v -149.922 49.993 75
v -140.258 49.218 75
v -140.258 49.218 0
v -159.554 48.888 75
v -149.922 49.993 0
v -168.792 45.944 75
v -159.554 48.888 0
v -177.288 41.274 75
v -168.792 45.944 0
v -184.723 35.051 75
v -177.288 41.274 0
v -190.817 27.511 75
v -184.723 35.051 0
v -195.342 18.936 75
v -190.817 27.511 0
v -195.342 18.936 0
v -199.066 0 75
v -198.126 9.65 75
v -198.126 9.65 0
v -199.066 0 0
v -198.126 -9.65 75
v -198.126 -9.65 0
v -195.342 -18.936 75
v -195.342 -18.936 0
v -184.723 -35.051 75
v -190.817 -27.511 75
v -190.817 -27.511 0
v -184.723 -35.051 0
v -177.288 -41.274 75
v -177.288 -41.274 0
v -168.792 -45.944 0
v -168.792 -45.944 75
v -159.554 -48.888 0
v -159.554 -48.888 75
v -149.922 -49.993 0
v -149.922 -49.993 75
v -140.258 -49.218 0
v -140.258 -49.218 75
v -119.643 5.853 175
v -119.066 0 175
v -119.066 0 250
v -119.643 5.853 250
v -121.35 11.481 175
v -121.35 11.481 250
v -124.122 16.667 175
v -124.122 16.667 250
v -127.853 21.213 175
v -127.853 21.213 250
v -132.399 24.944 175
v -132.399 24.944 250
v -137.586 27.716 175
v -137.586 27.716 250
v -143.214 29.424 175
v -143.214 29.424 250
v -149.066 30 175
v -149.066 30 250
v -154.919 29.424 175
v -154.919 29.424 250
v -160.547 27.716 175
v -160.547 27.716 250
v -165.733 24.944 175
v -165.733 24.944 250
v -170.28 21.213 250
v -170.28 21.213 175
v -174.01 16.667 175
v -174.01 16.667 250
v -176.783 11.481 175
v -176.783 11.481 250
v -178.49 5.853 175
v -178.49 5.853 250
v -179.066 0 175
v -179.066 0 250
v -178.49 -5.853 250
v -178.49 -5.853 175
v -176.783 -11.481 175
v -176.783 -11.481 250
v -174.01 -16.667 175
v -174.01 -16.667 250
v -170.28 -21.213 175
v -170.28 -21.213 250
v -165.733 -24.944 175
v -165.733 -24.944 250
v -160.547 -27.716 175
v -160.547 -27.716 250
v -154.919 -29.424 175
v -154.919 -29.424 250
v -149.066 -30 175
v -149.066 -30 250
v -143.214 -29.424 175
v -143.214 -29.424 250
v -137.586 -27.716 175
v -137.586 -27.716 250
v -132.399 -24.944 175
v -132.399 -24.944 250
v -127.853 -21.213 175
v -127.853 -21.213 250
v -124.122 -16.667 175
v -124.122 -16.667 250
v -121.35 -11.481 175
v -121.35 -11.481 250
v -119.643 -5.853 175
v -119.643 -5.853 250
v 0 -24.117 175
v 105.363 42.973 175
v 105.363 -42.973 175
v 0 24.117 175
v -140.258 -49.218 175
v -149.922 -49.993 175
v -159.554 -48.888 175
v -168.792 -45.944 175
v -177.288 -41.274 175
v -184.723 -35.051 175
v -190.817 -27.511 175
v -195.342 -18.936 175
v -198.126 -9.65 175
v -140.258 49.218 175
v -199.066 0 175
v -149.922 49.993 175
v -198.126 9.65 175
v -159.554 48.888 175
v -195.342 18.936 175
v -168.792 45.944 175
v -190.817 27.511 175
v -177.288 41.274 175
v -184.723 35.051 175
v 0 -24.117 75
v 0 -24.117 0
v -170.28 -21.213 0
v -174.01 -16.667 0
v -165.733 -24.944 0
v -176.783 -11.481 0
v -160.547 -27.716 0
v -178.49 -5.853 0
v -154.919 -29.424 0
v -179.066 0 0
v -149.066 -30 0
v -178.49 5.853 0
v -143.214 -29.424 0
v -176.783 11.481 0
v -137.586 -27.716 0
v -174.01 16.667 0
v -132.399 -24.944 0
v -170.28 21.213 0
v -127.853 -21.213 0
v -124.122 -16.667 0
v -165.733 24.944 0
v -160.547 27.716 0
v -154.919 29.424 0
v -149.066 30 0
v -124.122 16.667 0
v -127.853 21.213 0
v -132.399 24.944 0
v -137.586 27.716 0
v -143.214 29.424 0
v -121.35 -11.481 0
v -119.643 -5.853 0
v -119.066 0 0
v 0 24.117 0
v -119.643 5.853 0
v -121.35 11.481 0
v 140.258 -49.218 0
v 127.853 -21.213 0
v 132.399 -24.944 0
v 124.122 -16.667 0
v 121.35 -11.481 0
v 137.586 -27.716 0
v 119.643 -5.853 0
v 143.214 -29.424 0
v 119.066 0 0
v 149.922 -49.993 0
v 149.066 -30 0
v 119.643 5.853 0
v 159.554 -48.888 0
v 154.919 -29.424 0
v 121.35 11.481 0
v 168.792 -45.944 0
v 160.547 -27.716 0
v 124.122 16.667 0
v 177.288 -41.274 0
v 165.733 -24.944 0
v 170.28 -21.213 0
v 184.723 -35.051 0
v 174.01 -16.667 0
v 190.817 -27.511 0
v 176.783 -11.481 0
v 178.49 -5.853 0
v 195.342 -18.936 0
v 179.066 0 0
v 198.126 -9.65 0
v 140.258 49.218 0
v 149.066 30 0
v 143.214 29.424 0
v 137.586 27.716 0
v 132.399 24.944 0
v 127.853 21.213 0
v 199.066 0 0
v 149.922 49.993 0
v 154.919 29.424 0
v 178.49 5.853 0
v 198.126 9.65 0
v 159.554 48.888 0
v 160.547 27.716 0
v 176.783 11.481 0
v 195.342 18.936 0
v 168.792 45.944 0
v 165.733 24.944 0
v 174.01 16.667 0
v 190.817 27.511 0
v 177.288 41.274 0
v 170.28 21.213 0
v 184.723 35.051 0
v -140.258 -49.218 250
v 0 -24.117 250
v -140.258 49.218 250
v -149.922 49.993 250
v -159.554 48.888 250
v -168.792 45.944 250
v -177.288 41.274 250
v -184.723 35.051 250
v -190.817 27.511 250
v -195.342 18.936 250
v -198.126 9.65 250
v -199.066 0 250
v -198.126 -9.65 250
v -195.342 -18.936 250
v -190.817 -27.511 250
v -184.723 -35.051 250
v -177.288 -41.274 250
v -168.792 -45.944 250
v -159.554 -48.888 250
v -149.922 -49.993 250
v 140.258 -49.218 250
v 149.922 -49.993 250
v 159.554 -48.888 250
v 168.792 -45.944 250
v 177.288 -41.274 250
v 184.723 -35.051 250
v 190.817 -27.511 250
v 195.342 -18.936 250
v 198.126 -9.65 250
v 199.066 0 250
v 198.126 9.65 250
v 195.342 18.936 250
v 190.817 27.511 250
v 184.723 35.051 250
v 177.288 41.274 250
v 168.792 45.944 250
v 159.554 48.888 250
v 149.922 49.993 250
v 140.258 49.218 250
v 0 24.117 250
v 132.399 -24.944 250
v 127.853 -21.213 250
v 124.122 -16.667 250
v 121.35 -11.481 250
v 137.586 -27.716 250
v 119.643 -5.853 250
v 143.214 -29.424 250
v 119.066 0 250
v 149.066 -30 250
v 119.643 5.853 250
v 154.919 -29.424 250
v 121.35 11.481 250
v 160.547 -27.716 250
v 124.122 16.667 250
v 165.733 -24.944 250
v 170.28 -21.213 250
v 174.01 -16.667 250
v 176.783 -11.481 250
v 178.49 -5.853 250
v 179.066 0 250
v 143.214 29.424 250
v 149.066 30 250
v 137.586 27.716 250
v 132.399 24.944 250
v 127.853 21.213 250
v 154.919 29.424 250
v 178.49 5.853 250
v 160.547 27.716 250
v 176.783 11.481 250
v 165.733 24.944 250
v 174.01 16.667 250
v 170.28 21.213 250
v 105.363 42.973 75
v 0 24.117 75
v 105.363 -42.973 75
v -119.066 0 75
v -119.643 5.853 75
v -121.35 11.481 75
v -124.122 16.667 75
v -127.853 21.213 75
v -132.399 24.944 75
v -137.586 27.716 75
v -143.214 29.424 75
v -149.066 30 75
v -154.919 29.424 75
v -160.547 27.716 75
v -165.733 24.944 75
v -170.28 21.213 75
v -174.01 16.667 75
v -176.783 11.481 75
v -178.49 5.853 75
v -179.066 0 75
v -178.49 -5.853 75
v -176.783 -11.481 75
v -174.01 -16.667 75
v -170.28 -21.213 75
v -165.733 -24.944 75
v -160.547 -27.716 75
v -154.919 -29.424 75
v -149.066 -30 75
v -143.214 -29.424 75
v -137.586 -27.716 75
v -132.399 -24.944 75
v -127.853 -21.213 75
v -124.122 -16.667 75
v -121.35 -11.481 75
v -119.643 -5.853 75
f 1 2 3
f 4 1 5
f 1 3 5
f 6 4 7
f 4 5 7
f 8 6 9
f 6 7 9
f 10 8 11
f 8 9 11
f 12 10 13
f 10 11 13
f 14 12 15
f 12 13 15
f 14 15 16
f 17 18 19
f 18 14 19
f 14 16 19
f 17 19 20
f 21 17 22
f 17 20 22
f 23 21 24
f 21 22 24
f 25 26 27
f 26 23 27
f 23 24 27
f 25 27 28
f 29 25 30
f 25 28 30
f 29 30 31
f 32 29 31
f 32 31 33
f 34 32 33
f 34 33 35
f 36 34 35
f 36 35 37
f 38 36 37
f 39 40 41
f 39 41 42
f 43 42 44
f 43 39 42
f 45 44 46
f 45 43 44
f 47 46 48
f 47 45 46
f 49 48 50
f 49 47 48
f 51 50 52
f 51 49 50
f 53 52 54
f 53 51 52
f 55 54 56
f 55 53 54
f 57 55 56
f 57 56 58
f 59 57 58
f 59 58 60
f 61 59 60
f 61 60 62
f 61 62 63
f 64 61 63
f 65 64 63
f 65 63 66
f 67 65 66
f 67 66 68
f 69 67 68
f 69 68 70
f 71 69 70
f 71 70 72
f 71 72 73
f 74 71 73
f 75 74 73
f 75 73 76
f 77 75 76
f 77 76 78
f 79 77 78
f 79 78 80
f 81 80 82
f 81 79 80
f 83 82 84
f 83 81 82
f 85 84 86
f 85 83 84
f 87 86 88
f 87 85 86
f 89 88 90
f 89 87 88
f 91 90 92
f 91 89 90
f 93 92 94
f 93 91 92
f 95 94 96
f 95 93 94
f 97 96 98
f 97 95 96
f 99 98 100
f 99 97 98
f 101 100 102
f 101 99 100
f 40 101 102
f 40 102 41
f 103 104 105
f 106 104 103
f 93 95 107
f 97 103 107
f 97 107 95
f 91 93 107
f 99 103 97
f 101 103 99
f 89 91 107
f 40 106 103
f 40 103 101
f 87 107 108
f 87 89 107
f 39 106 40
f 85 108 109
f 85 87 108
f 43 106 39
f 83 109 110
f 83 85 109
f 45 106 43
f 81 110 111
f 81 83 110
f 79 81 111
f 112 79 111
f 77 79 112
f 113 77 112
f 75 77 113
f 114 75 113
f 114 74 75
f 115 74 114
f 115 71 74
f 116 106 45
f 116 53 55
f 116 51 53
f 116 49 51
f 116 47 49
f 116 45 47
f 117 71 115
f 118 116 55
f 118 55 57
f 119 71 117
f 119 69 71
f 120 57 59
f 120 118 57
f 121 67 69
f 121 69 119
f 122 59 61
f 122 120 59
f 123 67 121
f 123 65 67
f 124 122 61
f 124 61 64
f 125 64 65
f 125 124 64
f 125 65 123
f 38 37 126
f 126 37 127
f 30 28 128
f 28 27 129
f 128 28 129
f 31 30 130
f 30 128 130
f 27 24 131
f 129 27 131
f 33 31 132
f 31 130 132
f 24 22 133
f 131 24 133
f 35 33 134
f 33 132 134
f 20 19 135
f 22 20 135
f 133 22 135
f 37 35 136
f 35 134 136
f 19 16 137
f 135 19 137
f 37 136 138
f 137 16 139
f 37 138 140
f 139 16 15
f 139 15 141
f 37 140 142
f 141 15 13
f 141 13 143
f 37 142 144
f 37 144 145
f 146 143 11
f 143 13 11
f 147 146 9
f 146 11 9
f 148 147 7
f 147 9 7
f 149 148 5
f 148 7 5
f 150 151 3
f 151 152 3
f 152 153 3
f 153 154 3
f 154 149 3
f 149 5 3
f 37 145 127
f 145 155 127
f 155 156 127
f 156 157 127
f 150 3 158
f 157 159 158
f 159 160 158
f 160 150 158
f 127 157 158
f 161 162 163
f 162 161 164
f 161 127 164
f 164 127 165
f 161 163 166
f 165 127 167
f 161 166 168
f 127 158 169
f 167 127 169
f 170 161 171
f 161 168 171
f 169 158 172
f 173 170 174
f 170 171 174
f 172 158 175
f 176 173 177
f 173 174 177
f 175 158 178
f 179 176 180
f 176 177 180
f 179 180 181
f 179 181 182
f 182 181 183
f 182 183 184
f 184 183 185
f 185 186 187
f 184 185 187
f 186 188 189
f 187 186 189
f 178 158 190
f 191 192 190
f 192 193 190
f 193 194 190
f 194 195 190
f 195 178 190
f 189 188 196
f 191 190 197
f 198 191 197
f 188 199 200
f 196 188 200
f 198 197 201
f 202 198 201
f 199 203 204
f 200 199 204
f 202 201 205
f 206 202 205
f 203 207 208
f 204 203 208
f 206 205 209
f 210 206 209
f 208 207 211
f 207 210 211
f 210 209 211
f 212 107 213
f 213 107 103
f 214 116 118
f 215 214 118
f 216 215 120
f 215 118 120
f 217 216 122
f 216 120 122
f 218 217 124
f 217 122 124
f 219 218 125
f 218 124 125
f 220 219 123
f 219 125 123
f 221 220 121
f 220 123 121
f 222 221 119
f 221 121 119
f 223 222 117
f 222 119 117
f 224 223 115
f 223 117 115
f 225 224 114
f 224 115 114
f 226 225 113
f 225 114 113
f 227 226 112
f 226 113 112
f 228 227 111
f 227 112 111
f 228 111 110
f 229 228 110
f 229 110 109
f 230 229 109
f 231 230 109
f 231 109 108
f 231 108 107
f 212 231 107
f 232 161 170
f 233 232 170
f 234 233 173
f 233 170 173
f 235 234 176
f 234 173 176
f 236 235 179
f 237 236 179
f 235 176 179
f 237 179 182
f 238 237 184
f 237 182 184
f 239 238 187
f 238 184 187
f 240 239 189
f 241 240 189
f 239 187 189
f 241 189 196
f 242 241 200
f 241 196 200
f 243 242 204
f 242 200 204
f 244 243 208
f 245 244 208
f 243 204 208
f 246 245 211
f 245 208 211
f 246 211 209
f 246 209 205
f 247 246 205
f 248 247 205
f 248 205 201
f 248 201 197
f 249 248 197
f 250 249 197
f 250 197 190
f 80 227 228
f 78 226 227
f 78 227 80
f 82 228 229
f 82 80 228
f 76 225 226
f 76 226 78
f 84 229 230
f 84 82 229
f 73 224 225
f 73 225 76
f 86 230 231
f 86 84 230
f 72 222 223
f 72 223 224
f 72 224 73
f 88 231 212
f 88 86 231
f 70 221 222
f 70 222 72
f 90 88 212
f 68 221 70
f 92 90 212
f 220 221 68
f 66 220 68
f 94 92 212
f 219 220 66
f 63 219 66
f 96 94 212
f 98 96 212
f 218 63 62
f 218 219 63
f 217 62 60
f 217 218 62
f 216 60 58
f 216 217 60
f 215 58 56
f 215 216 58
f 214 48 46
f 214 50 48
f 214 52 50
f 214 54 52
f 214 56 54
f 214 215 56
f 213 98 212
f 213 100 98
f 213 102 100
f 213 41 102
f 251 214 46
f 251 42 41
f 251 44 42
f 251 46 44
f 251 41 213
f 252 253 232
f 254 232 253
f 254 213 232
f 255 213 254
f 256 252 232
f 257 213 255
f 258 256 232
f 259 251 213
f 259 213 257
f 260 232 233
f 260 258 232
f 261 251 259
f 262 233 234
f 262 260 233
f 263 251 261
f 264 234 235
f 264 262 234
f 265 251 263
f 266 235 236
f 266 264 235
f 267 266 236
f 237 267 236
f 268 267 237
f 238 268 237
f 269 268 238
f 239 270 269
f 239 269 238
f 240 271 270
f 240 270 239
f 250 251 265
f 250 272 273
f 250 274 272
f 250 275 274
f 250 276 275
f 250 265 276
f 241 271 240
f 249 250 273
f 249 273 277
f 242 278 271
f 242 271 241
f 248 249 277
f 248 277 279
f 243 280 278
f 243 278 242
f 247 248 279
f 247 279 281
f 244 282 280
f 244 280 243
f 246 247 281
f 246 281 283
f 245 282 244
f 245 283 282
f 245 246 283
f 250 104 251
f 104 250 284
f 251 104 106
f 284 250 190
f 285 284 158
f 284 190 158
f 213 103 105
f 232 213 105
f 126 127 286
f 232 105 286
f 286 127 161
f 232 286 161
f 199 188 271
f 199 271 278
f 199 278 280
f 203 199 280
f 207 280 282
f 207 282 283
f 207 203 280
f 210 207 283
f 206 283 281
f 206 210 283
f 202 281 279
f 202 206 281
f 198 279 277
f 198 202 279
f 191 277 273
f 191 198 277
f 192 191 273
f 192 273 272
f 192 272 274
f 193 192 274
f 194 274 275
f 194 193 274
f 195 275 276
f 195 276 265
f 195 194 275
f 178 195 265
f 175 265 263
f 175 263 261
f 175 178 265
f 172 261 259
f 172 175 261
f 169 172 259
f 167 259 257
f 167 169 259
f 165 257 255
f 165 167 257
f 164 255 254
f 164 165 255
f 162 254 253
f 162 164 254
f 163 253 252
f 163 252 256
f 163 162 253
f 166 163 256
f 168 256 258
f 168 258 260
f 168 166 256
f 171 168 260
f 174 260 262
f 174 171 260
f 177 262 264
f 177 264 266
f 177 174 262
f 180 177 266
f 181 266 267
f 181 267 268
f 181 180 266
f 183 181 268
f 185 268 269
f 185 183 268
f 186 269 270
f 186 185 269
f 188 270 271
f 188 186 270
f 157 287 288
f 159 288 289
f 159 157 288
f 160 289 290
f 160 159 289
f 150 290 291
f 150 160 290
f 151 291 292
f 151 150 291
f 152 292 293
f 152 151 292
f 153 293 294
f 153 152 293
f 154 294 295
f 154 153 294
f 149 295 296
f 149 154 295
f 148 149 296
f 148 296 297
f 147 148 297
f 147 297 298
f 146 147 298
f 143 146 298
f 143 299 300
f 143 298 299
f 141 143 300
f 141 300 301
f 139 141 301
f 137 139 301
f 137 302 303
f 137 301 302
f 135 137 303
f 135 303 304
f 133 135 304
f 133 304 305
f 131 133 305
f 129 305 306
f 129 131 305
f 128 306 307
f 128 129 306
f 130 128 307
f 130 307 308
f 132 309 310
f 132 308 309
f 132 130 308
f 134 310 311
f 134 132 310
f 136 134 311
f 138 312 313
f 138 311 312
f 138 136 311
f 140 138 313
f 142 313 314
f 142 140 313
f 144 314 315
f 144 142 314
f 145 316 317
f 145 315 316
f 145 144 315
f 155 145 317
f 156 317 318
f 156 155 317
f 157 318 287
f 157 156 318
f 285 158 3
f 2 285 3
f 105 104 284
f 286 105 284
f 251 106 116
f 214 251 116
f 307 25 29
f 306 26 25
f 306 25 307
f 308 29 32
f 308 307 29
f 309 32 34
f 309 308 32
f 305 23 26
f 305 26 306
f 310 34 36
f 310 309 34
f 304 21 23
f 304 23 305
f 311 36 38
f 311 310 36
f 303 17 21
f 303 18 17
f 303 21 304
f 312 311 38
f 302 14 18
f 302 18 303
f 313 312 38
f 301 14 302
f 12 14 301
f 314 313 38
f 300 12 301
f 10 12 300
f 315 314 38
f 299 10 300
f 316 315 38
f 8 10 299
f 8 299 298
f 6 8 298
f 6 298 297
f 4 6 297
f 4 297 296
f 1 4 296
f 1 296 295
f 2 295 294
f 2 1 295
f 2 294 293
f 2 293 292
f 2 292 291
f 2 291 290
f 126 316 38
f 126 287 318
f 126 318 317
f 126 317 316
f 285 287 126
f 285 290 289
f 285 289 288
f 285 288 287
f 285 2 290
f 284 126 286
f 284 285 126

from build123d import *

# Parameters (mm, degrees)
SKETCH1_R           = 50
SKETCH1_R_2         = 30
BOSS_EXTRUDE1_DEPTH = 250
CUT_EXTRUDE1_DEPTH  = 125


with BuildPart() as part:
    # Sketch1 → Boss-Extrude1 (new body)
    with BuildSketch(Plane.XY):
        with Locations((-149.066301709, 0)):
            Circle(SKETCH1_R)
        with Locations((-149.066301709, 0)):
            Circle(SKETCH1_R_2, mode=Mode.SUBTRACT)
        with BuildLine():
            Line((0, 24.117418171), (-140.258226128, 49.218063803))
            ThreePointArc((-140.258226128, 49.218063803), (-110.72308993, 32.090467595), (-99.066301709, 0))
            ThreePointArc((-99.066301709, 0), (-110.72309003, -32.090467715), (-140.258226436, -49.218063859))
            Line((-140.258226436, -49.218063859), (0, -24.117418171))
            Line((0, -24.117418171), (140.258224826, -49.21806357))
            ThreePointArc((140.258224826, -49.21806357), (99.066301709, 3.12e-07), (140.258225441, 49.21806368))
            Line((140.258225441, 49.21806368), (0, 24.117418171))
        make_face()
        with Locations((149.066301709, 0)):
            Circle(SKETCH1_R)
        with Locations((149.066301709, 0)):
            Circle(SKETCH1_R_2, mode=Mode.SUBTRACT)
    extrude(amount=BOSS_EXTRUDE1_DEPTH)

    # Sketch2 → Cut-Extrude1 (cut, symmetric)
    with BuildSketch(Plane(origin=(0, 0, 0), x_dir=(1, 0, 0), z_dir=(0, 1, 0))):
        Polygon((-199.066301709, -75), (105.363390816, -75), (105.363390816, -125), (105.363390816, -175), (-199.066301709, -175), align=None)
    extrude(amount=CUT_EXTRUDE1_DEPTH, both=True, mode=Mode.SUBTRACT)


solid = part.part
